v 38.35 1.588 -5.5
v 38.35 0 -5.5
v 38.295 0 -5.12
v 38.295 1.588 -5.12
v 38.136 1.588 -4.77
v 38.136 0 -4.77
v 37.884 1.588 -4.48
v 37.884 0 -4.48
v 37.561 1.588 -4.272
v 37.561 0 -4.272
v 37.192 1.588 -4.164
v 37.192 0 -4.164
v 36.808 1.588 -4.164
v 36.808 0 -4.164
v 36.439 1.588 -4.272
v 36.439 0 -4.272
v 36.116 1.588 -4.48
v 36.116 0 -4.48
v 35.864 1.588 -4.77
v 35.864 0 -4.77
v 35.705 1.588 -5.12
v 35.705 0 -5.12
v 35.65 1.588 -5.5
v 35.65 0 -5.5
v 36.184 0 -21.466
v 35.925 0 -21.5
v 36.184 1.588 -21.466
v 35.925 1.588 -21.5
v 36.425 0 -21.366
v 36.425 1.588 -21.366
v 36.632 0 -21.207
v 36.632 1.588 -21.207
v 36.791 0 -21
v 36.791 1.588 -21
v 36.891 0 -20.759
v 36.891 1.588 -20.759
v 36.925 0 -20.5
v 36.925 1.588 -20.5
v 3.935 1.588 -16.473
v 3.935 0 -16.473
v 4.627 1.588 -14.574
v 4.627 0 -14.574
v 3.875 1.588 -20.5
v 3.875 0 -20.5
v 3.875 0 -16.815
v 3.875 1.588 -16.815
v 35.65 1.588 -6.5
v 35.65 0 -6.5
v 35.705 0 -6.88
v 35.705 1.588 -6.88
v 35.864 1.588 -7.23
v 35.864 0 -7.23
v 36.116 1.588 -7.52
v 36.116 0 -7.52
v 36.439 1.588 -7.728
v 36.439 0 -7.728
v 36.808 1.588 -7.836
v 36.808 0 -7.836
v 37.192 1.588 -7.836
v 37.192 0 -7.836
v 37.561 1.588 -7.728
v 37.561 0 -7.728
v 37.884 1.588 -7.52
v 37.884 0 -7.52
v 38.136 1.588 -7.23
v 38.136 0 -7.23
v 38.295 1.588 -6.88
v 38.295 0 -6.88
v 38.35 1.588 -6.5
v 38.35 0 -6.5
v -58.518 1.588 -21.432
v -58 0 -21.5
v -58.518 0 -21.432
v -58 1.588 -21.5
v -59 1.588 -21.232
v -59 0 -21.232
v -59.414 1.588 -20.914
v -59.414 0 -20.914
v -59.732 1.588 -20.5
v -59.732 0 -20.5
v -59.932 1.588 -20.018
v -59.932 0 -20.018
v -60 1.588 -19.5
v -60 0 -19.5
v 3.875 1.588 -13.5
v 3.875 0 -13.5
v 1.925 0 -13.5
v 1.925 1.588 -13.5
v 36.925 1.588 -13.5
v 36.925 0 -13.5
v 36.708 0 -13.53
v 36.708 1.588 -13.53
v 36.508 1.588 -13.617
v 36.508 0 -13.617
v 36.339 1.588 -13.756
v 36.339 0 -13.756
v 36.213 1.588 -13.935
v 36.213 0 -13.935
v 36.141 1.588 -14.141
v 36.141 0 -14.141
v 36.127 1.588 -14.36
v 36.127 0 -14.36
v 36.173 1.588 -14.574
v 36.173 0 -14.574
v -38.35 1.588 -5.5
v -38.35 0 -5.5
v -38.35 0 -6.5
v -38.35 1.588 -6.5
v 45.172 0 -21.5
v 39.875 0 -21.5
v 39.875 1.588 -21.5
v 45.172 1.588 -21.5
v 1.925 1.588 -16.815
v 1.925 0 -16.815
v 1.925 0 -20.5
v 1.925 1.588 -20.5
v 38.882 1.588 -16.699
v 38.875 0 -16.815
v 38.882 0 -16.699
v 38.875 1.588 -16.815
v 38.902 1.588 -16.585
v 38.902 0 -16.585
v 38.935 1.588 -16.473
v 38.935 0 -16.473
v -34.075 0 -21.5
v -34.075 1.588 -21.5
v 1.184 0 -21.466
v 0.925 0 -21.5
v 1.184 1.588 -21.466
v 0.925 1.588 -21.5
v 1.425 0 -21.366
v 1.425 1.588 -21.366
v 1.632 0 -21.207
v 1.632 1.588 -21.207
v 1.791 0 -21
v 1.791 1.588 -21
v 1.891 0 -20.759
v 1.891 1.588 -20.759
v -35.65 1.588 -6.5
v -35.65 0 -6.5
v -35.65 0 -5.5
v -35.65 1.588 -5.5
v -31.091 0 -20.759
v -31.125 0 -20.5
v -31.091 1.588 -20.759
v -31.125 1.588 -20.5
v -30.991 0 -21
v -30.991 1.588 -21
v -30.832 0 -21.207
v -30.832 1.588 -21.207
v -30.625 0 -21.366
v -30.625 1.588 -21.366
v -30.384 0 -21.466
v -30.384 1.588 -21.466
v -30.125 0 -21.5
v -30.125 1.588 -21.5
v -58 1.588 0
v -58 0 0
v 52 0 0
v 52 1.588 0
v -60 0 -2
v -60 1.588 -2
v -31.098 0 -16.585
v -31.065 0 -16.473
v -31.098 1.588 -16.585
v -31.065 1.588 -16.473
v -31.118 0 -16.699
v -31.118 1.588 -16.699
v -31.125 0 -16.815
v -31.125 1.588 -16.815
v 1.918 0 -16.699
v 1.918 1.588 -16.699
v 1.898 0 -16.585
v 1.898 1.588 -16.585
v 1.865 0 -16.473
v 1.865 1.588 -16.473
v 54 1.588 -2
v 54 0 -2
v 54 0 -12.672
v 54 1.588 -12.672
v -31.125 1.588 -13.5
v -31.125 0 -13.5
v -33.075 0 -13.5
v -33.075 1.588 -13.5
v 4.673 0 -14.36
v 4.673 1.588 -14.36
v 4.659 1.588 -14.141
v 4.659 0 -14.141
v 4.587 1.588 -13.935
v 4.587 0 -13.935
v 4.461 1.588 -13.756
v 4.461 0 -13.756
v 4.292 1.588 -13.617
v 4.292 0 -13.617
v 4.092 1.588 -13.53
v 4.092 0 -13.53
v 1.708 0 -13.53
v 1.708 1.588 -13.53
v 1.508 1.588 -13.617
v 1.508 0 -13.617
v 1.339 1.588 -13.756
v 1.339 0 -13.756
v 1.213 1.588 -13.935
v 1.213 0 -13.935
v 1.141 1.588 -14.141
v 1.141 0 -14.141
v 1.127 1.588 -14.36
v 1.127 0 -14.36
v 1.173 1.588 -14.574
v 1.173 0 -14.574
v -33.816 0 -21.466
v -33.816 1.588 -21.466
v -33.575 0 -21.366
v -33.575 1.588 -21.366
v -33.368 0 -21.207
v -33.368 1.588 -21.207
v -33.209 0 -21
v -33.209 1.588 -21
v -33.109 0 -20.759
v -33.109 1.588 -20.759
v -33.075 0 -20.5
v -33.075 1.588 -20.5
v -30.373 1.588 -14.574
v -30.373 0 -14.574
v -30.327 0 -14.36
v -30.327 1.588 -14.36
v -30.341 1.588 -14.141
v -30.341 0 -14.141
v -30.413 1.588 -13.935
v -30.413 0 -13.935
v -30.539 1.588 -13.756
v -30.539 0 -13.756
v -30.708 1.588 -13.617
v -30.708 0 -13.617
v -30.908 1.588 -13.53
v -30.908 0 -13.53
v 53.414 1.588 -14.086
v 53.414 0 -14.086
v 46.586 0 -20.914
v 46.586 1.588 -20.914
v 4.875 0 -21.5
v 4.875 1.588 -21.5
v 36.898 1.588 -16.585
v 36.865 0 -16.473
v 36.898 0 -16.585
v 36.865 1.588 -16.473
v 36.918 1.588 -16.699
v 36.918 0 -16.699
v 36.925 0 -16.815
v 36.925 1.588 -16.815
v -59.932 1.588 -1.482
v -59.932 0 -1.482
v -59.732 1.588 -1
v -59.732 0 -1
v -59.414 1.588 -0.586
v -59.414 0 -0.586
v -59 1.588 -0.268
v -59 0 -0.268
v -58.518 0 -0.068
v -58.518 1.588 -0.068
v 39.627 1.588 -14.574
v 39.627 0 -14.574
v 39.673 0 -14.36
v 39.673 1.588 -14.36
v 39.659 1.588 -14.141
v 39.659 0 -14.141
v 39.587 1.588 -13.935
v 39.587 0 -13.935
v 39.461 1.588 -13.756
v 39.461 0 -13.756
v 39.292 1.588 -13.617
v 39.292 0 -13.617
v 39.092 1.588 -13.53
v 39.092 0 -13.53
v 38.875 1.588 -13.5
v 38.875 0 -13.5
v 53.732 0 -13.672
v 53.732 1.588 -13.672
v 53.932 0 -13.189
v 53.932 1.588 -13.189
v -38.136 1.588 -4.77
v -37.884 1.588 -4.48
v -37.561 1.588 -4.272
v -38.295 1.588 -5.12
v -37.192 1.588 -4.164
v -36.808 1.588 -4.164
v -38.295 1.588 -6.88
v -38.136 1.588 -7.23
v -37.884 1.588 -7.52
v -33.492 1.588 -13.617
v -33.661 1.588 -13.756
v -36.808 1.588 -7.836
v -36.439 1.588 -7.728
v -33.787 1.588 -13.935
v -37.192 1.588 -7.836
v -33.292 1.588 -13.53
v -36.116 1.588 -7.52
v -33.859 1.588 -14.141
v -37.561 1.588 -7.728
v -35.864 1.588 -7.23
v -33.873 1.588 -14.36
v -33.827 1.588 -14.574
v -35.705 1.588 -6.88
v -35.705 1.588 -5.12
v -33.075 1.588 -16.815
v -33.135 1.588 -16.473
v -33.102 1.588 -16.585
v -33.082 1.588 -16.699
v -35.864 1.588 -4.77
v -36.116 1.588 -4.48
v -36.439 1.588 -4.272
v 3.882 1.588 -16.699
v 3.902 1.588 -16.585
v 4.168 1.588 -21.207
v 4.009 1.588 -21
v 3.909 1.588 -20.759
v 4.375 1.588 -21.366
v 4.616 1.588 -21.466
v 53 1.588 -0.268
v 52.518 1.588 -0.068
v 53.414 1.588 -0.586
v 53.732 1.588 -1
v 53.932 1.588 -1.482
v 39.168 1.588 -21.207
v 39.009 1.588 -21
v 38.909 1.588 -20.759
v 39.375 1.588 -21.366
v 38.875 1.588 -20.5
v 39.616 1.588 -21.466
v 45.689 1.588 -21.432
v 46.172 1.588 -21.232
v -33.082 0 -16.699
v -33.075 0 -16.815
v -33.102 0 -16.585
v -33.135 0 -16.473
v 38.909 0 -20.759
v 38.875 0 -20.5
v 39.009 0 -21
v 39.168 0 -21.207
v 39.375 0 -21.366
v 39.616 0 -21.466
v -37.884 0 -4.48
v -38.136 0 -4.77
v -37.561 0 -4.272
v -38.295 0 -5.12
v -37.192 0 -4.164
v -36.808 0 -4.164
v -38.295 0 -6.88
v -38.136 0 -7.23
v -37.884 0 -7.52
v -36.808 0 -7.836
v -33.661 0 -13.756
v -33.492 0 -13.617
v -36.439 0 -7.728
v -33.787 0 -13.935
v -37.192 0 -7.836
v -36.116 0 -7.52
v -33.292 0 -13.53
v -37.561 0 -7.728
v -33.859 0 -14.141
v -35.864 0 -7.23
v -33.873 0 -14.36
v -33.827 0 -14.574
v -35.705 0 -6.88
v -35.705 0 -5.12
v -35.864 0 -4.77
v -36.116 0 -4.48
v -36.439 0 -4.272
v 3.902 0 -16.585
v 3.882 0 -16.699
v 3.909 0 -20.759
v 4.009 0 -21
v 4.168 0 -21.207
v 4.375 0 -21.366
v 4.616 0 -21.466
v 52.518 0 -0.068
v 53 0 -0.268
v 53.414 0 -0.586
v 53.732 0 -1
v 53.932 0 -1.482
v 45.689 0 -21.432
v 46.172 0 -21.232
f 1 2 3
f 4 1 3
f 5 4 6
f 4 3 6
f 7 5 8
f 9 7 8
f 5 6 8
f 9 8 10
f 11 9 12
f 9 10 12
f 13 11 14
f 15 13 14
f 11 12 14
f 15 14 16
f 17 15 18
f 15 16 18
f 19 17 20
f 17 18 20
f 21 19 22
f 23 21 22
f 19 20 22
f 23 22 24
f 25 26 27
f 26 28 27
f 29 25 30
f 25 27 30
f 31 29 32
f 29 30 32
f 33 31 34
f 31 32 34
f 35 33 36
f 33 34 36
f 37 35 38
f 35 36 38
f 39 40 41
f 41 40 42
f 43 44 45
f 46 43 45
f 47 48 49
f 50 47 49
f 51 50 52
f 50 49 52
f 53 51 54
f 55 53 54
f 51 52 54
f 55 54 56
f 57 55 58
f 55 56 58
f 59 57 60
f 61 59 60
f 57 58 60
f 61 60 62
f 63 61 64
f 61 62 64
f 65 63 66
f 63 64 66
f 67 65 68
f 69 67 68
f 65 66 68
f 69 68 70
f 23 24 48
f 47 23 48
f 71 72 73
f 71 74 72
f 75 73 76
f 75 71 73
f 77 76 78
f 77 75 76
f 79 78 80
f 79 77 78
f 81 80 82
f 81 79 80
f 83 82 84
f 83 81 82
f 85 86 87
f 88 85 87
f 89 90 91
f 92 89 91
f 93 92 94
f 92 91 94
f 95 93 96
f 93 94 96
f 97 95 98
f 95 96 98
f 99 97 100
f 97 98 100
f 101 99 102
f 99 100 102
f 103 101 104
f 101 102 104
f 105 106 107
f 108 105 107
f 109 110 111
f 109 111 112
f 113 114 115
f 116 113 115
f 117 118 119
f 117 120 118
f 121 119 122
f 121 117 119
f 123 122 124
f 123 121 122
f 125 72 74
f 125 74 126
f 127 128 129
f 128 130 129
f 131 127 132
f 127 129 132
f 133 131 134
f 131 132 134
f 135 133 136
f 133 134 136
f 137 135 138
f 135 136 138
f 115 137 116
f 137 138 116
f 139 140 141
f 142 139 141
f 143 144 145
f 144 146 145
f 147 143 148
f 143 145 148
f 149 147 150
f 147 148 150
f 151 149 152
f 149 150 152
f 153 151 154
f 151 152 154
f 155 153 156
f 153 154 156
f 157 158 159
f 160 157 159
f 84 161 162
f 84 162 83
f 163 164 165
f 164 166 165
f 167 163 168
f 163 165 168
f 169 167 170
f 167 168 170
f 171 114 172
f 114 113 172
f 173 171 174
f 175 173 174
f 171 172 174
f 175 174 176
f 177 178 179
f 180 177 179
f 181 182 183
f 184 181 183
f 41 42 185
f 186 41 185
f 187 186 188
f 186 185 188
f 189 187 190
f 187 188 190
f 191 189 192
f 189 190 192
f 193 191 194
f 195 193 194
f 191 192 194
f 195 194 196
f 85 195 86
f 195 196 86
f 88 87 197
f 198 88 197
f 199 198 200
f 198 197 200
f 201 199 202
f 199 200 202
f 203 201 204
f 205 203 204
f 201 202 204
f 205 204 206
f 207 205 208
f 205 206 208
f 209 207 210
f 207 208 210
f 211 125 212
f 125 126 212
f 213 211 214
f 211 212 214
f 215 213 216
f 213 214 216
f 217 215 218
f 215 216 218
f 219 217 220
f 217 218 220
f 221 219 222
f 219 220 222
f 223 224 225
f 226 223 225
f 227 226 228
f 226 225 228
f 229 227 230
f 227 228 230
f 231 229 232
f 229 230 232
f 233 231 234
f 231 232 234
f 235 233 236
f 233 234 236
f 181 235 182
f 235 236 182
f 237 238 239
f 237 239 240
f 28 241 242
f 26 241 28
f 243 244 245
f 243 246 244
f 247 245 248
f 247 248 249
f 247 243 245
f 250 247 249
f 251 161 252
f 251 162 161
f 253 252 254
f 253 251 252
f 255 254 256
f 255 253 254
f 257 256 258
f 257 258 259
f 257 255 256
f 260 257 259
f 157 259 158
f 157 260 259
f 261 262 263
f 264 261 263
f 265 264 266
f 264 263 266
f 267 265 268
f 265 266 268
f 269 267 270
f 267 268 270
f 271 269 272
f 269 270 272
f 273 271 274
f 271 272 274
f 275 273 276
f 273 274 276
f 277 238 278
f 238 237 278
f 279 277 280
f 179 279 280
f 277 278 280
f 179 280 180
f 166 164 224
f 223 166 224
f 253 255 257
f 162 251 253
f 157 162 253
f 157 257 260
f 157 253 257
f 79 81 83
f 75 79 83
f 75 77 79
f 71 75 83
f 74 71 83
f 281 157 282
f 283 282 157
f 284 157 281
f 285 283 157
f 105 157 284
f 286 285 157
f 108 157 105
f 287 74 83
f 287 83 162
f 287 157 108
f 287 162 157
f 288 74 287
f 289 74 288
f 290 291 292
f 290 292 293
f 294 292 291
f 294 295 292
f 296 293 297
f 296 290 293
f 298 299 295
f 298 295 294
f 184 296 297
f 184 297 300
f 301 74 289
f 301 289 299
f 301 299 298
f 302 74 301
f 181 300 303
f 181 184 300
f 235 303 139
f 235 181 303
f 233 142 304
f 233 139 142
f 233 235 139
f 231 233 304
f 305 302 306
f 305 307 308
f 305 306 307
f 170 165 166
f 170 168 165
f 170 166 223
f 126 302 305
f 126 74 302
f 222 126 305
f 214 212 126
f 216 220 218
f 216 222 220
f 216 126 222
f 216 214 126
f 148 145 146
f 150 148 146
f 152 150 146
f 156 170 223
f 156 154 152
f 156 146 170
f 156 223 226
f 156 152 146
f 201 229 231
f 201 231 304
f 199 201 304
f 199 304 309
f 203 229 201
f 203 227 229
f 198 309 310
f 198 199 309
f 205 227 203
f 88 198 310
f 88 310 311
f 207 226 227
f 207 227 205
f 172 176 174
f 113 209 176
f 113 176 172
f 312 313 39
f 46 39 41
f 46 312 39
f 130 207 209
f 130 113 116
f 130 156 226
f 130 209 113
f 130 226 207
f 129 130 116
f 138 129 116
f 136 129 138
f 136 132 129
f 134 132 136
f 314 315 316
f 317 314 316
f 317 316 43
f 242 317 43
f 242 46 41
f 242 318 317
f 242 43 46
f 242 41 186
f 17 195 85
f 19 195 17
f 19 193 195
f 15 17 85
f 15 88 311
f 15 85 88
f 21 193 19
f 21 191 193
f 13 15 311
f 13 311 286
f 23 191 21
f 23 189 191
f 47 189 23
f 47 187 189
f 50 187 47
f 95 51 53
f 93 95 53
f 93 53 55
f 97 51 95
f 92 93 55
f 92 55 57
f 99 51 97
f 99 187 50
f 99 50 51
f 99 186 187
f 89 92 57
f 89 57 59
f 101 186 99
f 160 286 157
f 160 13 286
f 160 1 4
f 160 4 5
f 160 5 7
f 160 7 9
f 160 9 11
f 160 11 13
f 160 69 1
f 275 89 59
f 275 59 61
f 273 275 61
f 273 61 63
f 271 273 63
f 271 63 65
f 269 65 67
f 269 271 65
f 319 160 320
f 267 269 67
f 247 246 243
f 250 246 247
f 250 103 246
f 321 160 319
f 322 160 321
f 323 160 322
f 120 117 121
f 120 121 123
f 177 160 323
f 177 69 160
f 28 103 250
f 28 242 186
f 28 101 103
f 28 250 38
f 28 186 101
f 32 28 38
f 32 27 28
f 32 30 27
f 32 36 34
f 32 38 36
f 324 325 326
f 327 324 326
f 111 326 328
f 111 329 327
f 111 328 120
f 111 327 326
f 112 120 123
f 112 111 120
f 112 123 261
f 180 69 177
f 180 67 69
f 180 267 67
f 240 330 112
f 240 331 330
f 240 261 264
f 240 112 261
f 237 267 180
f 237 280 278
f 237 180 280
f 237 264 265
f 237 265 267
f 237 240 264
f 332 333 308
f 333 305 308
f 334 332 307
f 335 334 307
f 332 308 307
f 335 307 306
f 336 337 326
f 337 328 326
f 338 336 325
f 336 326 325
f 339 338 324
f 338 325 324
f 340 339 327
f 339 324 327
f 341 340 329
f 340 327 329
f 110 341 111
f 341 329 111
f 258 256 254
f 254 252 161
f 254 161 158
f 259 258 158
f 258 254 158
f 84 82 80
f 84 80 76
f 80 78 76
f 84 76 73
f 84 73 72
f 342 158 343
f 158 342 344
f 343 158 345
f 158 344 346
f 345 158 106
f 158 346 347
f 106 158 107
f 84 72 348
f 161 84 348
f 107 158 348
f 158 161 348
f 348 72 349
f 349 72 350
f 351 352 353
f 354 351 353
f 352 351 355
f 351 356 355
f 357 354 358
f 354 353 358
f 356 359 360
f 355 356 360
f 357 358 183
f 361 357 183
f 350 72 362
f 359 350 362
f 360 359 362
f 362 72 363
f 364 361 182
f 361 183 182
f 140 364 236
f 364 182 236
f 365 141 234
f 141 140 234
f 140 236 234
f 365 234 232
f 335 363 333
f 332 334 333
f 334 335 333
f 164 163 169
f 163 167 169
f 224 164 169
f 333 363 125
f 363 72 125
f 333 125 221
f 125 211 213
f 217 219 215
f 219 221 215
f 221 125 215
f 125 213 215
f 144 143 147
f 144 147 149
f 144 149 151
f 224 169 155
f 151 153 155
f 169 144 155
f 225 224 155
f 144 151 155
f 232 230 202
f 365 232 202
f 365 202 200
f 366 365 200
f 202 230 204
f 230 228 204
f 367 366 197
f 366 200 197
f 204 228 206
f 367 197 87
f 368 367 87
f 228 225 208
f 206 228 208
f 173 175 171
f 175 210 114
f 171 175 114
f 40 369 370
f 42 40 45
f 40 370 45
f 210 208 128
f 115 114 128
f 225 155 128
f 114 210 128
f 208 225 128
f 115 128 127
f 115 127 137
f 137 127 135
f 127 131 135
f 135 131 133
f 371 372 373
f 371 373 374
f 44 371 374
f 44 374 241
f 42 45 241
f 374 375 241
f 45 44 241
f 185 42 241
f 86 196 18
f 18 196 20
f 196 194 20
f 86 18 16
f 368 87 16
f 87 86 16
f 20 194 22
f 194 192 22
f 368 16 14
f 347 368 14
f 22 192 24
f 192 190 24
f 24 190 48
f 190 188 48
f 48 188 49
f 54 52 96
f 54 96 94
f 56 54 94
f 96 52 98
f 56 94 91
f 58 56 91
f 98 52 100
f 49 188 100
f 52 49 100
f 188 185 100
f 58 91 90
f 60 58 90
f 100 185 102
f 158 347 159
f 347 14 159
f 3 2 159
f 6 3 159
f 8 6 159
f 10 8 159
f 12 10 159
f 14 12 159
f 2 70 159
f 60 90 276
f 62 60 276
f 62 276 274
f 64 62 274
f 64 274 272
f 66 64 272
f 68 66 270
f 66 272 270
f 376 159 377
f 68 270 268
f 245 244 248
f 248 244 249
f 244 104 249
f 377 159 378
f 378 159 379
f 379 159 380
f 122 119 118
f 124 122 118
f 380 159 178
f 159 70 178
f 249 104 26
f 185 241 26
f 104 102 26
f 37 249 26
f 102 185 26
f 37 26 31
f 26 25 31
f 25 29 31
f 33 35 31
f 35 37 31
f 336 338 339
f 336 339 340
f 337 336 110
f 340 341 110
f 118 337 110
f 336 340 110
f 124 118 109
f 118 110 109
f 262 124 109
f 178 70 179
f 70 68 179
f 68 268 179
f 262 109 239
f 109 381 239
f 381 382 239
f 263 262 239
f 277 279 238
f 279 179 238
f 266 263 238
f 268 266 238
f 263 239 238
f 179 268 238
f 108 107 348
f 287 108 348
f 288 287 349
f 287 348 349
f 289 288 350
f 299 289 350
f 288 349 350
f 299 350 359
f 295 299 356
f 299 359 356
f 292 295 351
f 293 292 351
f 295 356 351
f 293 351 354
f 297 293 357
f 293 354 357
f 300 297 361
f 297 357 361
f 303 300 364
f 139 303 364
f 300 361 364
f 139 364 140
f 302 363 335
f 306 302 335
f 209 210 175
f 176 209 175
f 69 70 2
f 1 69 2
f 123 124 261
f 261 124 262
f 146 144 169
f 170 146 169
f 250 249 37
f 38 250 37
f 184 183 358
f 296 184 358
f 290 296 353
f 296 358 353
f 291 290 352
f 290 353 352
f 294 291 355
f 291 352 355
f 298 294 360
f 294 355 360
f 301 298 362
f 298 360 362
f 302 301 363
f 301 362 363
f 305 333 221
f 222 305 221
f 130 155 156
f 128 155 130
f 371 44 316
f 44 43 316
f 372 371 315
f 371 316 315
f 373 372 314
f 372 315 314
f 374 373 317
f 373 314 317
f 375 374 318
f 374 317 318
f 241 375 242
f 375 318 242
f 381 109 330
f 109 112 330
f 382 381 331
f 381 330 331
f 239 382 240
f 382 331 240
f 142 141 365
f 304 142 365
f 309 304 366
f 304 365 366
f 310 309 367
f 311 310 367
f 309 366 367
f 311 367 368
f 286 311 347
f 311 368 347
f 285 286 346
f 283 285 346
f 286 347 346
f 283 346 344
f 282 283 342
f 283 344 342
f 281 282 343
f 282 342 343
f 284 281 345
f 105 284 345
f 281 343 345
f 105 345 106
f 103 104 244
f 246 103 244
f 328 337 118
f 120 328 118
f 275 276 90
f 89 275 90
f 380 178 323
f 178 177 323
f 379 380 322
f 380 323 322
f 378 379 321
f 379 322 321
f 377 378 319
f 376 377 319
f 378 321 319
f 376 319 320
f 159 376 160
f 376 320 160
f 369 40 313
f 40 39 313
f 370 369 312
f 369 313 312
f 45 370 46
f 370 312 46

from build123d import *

# Parameters (mm, degrees)
SKETCH2_W           = 114
SKETCH2_H           = 21.5
BOSS_EXTRUDE1_DEPTH = 1.5875
CHAMFER1_SIZE       = 8
FILLET1_R           = 2
CUT_EXTRUDE1_DEPTH  = 2.5875
LPATTERN1_COUNT     = 3
LPATTERN1_PITCH     = 35
FILLET2_R           = 1
FILLET3_R           = 1


with BuildPart() as part:
    # Sketch2 → Boss-Extrude1 (new body)
    with BuildSketch(Plane(origin=(0, 0, 0), x_dir=(1, 0, 0), z_dir=(0, 1, 0))):
        with Locations((-3, 10.75)):
            Rectangle(SKETCH2_W, SKETCH2_H)
        with BuildLine():
            Line((-38.35, 5.5), (-38.35, 6.5))
            ThreePointArc((-38.35, 6.5), (-37, 7.85), (-35.65, 6.5))
            Line((-35.65, 6.5), (-35.65, 5.5))
            ThreePointArc((-35.65, 5.5), (-37, 4.15), (-38.35, 5.5))
        make_face(mode=Mode.SUBTRACT)
        with BuildLine():
            Line((35.65, 5.5), (35.65, 6.5))
            ThreePointArc((35.65, 6.5), (37, 7.85), (38.35, 6.5))
            Line((38.35, 6.5), (38.35, 5.5))
            ThreePointArc((38.35, 5.5), (37, 4.15), (35.65, 5.5))
        make_face(mode=Mode.SUBTRACT)
    extrude(amount=BOSS_EXTRUDE1_DEPTH)

    # Chamfer1
    chamfer1_edges = [part.edges().sort_by_distance(p)[0] for p in [
        (54, 0.79375, -21.5),
    ]]
    chamfer(chamfer1_edges, length=CHAMFER1_SIZE)

    # Fillet1
    fillet1_edges = [part.edges().sort_by_distance(p)[0] for p in [
        (46, 0.79375, -21.5),
        (54, 0.79375, -13.5),
        (-60, 0.79375, 0),
        (-60, 0.79375, -21.5),
        (54, 0.79375, 0),
    ]]
    fillet(fillet1_edges, radius=FILLET1_R)

    # Sketch3 → Cut-Extrude1 (cut, through all)
    with BuildSketch(Plane(origin=(0, 0, 0), x_dir=(1, 0, 0), z_dir=(0, 1, 0))):
        with BuildLine():
            Line((-33.075, 21.5), (-31.125, 21.5))
            Line((-31.125, 21.5), (-31.125, 16.63904352))
            Line((-31.125, 16.63904352), (-30.373245903, 14.573616115))
            ThreePointArc((-30.373245903, 14.573616115), (-30.469678365, 13.841138851), (-31.125, 13.5))
            Line((-31.125, 13.5), (-33.075, 13.5))
            ThreePointArc((-33.075, 13.5), (-33.730321635, 13.841138851), (-33.826754097, 14.573616115))
            Line((-33.826754097, 14.573616115), (-33.075, 16.63904352))
            Line((-33.075, 16.63904352), (-33.075, 21.5))
        make_face()
    cut_extrude1 = extrude(amount=CUT_EXTRUDE1_DEPTH, mode=Mode.SUBTRACT)

    # LPattern1: Cut-Extrude1 ×3
    with Locations(*[(i * LPATTERN1_PITCH, 0, 0) for i in range(1, LPATTERN1_COUNT)]):
        add(cut_extrude1, mode=Mode.SUBTRACT)

    # Fillet2
    fillet2_edges = [part.edges().sort_by_distance(p)[0] for p in [
        (3.875, 0.79375, -21.5),
        (1.925, 0.79375, -21.5),
        (38.875, 0.79375, -21.5),
        (36.925, 0.79375, -21.5),
        (-33.075, 0.79375, -21.5),
        (-31.125, 0.79375, -21.5),
    ]]
    fillet(fillet2_edges, radius=FILLET2_R)

    # Fillet3
    fillet3_edges = [part.edges().sort_by_distance(p)[0] for p in [
        (1.925, 0.79375, -16.63904352),
        (3.875, 0.79375, -16.63904352),
        (36.925, 0.79375, -16.63904352),
        (38.875, 0.79375, -16.63904352),
        (-33.075, 0.79375, -16.63904352),
        (-31.125, 0.79375, -16.63904352),
    ]]
    fillet(fillet3_edges, radius=FILLET3_R)


solid = part.part
